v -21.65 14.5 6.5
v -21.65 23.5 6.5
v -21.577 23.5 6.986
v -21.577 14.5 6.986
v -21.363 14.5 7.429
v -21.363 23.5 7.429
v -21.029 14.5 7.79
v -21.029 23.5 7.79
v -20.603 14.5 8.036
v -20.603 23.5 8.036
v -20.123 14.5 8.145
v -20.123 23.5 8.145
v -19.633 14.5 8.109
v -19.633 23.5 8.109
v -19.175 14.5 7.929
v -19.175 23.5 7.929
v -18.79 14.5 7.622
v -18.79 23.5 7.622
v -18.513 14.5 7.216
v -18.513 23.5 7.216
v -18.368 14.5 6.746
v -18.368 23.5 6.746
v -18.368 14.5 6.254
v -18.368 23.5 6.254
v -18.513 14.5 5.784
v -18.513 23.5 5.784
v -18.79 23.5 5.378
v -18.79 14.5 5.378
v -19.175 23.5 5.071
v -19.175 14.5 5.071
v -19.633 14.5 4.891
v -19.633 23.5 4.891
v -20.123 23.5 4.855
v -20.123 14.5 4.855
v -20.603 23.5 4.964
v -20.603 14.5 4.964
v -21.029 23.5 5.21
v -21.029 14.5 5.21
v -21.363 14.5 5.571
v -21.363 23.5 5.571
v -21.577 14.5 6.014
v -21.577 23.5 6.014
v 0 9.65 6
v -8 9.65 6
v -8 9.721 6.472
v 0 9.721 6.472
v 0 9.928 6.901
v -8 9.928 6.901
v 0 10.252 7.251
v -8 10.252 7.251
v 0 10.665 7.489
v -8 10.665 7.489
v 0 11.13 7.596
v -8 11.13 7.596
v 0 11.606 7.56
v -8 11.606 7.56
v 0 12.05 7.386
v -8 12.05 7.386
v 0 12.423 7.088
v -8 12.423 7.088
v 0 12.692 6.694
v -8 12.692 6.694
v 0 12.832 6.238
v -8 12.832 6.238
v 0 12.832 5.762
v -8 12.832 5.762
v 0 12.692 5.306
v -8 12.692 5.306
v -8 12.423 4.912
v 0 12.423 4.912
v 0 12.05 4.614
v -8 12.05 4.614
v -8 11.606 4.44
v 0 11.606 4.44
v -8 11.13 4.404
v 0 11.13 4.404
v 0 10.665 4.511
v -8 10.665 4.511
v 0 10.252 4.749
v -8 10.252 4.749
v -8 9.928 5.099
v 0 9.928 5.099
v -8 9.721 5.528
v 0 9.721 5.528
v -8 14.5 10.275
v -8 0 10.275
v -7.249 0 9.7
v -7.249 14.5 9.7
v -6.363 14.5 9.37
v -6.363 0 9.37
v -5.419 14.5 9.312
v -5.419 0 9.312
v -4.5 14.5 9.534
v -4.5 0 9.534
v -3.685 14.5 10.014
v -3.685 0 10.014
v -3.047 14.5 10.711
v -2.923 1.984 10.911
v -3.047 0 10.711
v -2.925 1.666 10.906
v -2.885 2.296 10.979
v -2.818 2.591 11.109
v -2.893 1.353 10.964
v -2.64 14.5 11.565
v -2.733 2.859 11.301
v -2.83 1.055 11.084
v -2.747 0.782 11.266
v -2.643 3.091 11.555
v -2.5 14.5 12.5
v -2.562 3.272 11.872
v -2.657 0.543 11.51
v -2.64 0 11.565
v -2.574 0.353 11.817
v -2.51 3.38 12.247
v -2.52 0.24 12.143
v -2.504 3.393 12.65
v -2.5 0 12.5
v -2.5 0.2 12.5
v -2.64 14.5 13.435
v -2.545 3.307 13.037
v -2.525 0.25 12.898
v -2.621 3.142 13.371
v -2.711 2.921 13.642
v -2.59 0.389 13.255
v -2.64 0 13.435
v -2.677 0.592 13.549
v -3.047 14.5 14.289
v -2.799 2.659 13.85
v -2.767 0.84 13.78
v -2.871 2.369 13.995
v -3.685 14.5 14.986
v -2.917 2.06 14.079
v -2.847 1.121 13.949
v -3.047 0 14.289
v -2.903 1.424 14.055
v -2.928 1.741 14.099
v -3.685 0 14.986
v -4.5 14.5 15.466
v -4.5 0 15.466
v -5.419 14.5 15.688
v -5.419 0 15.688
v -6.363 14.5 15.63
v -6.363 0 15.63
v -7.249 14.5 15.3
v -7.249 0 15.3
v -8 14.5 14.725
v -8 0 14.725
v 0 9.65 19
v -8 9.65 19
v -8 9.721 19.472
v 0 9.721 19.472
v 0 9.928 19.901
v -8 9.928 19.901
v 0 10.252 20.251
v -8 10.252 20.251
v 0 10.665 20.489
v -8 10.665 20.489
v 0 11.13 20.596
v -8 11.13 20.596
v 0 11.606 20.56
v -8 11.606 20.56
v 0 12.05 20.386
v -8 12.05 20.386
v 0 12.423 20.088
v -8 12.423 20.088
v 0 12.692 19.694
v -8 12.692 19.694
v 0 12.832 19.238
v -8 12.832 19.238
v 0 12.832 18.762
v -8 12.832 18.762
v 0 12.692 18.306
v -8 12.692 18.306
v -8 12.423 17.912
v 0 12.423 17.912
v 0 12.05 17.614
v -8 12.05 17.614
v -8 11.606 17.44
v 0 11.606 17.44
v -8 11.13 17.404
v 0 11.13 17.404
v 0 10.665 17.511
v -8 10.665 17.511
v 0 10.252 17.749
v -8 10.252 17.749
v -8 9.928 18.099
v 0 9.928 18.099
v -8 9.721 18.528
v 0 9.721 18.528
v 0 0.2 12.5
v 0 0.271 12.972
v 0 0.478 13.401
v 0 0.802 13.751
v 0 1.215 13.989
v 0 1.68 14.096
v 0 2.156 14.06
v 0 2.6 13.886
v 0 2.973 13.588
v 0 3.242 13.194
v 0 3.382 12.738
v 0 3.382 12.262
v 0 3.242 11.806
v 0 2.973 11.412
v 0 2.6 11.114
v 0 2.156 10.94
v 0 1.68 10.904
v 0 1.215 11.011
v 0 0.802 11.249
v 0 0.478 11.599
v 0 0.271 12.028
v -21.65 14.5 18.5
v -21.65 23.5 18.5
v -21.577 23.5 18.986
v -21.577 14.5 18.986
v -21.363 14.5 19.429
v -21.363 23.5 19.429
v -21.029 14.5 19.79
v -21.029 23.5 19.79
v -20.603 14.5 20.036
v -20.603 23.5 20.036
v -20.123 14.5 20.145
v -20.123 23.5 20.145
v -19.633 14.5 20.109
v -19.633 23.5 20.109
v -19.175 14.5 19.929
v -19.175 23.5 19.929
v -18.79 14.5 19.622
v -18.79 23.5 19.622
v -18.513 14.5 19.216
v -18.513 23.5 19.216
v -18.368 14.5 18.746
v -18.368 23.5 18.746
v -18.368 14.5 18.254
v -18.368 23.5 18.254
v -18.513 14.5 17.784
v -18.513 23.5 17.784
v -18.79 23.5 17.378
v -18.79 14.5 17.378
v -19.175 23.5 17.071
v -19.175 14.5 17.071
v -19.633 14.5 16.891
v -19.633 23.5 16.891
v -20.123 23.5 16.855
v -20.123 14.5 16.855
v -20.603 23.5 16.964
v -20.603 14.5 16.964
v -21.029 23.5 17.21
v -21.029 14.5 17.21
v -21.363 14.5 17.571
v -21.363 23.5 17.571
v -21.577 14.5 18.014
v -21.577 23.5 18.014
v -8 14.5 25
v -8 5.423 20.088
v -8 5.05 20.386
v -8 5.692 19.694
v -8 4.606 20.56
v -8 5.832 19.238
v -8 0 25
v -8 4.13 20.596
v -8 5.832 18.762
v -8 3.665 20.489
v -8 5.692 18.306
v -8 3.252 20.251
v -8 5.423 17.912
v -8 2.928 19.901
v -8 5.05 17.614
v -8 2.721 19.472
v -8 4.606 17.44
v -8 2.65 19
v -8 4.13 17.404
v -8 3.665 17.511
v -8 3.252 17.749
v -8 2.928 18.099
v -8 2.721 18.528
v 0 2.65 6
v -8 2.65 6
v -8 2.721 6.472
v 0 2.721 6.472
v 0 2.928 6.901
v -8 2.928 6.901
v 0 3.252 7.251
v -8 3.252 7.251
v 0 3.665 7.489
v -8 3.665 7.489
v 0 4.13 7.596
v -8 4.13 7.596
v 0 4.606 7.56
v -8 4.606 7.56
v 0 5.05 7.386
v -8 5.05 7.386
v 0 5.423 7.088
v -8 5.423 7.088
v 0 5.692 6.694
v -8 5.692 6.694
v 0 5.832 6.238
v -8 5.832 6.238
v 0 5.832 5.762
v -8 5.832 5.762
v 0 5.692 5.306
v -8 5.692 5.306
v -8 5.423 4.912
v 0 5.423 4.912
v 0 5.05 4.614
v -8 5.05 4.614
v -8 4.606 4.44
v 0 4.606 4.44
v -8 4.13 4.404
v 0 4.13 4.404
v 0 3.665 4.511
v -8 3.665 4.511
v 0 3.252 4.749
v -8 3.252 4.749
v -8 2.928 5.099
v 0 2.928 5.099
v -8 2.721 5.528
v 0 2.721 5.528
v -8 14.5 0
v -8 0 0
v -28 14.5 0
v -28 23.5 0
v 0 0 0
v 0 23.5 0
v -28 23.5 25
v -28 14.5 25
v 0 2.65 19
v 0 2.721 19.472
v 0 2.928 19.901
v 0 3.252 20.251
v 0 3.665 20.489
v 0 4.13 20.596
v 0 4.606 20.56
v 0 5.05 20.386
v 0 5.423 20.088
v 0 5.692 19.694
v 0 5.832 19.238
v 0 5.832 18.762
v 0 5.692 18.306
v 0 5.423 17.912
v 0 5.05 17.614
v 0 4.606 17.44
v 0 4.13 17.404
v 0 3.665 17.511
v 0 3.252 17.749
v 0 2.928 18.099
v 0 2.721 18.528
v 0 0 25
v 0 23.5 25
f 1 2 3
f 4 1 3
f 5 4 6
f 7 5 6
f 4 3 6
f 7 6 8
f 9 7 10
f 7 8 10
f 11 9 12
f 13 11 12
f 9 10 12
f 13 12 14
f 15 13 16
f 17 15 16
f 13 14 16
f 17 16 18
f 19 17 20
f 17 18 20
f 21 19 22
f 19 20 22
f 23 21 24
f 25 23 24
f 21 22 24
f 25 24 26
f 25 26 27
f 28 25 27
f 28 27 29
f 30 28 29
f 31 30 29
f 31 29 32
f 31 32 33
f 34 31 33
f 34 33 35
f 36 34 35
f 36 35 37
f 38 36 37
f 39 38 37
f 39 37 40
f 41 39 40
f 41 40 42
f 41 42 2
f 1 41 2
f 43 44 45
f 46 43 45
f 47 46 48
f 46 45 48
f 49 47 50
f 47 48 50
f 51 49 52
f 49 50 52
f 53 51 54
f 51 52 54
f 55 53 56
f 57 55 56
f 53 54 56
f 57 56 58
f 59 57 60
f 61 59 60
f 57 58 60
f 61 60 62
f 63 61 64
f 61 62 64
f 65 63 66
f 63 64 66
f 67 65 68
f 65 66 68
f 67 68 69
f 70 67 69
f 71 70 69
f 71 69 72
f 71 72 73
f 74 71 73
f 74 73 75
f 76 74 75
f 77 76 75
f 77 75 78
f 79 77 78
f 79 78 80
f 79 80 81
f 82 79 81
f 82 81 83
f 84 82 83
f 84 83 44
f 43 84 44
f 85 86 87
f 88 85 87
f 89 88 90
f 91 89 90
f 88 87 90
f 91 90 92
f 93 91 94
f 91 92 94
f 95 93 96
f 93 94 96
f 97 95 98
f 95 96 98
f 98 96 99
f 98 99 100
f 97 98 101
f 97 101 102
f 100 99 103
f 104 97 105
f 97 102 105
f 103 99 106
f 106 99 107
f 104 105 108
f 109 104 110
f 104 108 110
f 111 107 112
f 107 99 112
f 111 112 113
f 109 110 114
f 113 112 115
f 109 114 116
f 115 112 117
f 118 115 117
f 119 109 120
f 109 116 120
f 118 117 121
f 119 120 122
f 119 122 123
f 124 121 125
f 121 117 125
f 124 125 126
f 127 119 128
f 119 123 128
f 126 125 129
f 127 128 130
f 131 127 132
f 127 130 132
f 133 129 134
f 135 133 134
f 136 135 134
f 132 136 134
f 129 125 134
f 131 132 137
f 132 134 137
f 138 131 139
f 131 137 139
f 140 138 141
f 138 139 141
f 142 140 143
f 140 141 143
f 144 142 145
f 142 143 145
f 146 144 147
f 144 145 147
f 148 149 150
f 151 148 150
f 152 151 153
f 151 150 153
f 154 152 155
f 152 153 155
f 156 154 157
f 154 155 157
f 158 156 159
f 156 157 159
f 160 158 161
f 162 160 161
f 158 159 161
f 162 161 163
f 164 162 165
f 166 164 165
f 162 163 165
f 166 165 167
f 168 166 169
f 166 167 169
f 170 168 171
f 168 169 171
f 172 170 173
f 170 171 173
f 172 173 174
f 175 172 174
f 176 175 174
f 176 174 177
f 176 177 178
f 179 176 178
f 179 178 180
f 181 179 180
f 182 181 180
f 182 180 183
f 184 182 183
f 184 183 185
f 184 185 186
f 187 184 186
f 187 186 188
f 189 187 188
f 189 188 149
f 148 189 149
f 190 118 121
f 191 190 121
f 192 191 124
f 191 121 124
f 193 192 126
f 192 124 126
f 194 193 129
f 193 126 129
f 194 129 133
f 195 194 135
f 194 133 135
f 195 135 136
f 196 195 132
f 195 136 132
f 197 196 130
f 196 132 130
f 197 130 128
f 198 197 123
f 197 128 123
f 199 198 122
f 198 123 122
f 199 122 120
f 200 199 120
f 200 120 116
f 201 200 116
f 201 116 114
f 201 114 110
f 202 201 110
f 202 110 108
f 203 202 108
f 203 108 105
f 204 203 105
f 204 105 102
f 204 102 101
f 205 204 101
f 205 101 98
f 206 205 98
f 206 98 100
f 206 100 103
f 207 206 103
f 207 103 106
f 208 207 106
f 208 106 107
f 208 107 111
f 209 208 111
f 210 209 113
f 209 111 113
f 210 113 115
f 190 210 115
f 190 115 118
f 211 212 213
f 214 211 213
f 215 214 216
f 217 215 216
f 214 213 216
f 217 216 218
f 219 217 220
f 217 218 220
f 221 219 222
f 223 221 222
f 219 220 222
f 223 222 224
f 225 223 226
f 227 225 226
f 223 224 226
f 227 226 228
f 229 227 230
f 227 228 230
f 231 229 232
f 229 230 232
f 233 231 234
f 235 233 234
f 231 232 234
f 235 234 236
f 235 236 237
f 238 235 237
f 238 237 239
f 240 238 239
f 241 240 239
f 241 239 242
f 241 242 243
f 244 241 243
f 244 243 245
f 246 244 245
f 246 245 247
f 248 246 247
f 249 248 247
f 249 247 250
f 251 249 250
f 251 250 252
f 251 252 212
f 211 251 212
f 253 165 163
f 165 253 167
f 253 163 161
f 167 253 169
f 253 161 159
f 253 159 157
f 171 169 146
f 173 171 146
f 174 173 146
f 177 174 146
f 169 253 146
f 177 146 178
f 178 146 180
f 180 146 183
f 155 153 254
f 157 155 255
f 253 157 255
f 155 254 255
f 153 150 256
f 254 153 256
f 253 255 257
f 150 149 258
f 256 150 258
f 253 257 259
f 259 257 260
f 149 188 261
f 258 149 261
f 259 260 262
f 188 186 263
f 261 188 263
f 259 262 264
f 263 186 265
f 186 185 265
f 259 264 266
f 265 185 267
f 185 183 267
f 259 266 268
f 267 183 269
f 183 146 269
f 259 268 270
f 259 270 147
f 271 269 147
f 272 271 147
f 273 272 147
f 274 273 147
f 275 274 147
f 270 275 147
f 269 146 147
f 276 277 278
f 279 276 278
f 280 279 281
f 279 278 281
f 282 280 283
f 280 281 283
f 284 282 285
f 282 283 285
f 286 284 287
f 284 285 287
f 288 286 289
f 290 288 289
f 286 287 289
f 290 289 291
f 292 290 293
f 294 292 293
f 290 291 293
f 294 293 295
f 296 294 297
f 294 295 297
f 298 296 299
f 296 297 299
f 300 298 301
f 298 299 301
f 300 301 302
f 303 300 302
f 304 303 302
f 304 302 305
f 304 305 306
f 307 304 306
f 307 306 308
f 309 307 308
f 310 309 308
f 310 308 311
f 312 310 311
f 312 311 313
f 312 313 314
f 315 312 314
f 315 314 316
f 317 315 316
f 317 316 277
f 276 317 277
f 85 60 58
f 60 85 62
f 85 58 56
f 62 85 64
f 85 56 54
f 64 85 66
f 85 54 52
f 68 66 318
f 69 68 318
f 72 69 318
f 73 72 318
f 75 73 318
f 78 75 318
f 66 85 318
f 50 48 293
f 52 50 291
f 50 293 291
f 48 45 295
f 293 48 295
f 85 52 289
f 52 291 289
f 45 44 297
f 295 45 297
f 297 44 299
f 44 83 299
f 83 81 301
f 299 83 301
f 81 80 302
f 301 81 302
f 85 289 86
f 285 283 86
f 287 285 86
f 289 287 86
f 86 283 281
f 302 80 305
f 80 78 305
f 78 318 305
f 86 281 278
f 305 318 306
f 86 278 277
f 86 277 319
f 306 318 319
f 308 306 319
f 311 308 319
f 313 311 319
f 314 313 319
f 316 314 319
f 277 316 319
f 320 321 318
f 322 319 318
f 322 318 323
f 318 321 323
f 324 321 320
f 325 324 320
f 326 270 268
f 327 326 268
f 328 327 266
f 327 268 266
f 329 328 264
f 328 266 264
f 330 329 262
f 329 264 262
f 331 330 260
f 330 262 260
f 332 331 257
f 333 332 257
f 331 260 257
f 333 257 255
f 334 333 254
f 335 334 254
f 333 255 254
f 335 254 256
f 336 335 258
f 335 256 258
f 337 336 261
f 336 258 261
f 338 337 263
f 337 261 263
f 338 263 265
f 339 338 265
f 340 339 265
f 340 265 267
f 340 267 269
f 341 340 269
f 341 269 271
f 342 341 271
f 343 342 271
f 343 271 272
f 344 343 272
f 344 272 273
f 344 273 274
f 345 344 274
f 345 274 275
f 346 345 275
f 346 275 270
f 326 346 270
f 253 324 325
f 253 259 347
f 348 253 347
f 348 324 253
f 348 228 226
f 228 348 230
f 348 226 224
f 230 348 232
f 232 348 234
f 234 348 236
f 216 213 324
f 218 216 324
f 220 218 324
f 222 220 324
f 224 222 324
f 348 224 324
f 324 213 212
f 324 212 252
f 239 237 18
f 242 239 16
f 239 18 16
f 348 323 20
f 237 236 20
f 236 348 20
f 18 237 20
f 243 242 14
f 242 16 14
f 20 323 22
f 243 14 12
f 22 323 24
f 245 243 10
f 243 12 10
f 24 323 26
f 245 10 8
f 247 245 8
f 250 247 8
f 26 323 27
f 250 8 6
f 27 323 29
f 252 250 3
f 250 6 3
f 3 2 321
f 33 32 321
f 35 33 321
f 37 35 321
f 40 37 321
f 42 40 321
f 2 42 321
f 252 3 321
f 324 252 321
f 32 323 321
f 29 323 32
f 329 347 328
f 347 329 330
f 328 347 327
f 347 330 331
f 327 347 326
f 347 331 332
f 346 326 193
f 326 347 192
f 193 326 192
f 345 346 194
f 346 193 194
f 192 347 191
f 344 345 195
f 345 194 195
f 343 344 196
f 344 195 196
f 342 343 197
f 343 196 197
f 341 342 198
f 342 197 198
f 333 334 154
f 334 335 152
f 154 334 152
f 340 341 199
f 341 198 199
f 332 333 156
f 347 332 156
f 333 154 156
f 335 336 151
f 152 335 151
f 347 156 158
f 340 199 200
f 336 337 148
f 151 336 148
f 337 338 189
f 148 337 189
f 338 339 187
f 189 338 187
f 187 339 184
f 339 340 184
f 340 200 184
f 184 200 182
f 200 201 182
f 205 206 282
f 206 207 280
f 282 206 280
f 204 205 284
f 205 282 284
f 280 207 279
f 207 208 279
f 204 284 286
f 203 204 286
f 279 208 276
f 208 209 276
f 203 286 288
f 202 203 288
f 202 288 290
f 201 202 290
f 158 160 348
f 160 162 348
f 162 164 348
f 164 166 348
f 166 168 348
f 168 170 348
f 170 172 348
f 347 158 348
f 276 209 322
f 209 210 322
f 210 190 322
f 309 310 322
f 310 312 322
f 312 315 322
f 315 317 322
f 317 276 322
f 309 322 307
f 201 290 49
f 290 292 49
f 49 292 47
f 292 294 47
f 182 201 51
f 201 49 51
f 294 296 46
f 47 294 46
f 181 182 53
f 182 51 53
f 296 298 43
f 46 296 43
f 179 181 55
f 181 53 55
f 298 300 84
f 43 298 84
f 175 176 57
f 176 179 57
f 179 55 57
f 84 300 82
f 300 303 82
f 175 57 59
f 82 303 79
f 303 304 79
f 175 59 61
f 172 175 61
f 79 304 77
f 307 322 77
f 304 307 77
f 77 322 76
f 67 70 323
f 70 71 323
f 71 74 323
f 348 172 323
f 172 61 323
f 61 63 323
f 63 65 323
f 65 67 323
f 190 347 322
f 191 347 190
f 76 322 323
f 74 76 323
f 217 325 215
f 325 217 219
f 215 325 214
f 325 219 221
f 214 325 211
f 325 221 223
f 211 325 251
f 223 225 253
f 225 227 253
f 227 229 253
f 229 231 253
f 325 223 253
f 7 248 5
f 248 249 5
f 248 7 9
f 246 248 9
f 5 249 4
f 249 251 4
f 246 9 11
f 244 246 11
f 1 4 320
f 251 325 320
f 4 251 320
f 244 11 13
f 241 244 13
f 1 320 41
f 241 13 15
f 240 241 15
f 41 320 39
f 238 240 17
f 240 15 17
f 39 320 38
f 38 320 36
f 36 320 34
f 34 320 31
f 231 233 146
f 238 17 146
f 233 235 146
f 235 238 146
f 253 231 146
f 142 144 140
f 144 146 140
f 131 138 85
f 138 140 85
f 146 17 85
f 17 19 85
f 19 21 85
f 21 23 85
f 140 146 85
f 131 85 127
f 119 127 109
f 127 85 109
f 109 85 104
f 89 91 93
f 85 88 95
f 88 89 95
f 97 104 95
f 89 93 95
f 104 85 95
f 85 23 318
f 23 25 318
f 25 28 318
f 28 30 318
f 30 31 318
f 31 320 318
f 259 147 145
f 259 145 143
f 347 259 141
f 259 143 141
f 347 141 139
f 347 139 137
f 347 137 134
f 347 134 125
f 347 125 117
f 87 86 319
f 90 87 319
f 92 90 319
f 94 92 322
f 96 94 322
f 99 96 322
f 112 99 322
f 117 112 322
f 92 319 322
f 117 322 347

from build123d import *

# Parameters (mm, degrees)
EXTRUDE_1_DEPTH     = 25
SKETCH_2_R          = 1.65
CUT_EXTRUDE_1_DEPTH = 33
SKETCH_3_R          = 1.6
CUT_EXTRUDE_2_DEPTH = 33
CUT_EXTRUDE_3_DEPTH = 14.5


with BuildPart() as part:
    # 草图1 → 凸台-拉伸1 (new body)
    with BuildSketch(Plane.XY):
        Polygon((0, 0), (0, 23.5), (-28, 23.5), (-28, 14.5), (-8, 14.5), (-8, 0), align=None)
    extrude(amount=EXTRUDE_1_DEPTH)

    # 草图2 → 切除-拉伸1 (cut)
    with BuildSketch(Plane(origin=(0, 23.5, 0), x_dir=(1, 0, 0), z_dir=(0, 1, 0))):
        with Locations(Location((-20, -6.5, 0), (0, 0, 180))):
            Circle(SKETCH_2_R)
        with Locations(Location((-20, -18.5, 0), (0, 0, 180))):
            Circle(SKETCH_2_R)
    extrude(amount=-CUT_EXTRUDE_1_DEPTH, mode=Mode.SUBTRACT)

    # 草图3 → 切除-拉伸2 (cut)
    with BuildSketch(Plane.ZY.offset(8)):
        with Locations(Location((6, 11.25, 0), (0, 0, 270))):
            Circle(SKETCH_3_R)
        with Locations(Location((19, 11.25, 0), (0, 0, 270))):
            Circle(SKETCH_3_R)
        with Locations(Location((12.5, 1.8, 0), (0, 0, 270))):
            Circle(SKETCH_3_R)
        with Locations(Location((6, 4.25, 0), (0, 0, 270))):
            Circle(SKETCH_3_R)
        with Locations(Location((19, 4.25, 0), (0, 0, 270))):
            Circle(SKETCH_3_R)
    extrude(amount=-CUT_EXTRUDE_2_DEPTH, mode=Mode.SUBTRACT)

    # 草图4 → 切除-拉伸3 (cut)
    with BuildSketch(Plane.XZ):
        with BuildLine():
            Line((-8, 14.724859546), (-8, 10.275140454))
            ThreePointArc((-8, 10.275140454), (-2.5, 12.5), (-8, 14.724859546))
        make_face()
    extrude(amount=-CUT_EXTRUDE_3_DEPTH, mode=Mode.SUBTRACT)


solid = part.part
